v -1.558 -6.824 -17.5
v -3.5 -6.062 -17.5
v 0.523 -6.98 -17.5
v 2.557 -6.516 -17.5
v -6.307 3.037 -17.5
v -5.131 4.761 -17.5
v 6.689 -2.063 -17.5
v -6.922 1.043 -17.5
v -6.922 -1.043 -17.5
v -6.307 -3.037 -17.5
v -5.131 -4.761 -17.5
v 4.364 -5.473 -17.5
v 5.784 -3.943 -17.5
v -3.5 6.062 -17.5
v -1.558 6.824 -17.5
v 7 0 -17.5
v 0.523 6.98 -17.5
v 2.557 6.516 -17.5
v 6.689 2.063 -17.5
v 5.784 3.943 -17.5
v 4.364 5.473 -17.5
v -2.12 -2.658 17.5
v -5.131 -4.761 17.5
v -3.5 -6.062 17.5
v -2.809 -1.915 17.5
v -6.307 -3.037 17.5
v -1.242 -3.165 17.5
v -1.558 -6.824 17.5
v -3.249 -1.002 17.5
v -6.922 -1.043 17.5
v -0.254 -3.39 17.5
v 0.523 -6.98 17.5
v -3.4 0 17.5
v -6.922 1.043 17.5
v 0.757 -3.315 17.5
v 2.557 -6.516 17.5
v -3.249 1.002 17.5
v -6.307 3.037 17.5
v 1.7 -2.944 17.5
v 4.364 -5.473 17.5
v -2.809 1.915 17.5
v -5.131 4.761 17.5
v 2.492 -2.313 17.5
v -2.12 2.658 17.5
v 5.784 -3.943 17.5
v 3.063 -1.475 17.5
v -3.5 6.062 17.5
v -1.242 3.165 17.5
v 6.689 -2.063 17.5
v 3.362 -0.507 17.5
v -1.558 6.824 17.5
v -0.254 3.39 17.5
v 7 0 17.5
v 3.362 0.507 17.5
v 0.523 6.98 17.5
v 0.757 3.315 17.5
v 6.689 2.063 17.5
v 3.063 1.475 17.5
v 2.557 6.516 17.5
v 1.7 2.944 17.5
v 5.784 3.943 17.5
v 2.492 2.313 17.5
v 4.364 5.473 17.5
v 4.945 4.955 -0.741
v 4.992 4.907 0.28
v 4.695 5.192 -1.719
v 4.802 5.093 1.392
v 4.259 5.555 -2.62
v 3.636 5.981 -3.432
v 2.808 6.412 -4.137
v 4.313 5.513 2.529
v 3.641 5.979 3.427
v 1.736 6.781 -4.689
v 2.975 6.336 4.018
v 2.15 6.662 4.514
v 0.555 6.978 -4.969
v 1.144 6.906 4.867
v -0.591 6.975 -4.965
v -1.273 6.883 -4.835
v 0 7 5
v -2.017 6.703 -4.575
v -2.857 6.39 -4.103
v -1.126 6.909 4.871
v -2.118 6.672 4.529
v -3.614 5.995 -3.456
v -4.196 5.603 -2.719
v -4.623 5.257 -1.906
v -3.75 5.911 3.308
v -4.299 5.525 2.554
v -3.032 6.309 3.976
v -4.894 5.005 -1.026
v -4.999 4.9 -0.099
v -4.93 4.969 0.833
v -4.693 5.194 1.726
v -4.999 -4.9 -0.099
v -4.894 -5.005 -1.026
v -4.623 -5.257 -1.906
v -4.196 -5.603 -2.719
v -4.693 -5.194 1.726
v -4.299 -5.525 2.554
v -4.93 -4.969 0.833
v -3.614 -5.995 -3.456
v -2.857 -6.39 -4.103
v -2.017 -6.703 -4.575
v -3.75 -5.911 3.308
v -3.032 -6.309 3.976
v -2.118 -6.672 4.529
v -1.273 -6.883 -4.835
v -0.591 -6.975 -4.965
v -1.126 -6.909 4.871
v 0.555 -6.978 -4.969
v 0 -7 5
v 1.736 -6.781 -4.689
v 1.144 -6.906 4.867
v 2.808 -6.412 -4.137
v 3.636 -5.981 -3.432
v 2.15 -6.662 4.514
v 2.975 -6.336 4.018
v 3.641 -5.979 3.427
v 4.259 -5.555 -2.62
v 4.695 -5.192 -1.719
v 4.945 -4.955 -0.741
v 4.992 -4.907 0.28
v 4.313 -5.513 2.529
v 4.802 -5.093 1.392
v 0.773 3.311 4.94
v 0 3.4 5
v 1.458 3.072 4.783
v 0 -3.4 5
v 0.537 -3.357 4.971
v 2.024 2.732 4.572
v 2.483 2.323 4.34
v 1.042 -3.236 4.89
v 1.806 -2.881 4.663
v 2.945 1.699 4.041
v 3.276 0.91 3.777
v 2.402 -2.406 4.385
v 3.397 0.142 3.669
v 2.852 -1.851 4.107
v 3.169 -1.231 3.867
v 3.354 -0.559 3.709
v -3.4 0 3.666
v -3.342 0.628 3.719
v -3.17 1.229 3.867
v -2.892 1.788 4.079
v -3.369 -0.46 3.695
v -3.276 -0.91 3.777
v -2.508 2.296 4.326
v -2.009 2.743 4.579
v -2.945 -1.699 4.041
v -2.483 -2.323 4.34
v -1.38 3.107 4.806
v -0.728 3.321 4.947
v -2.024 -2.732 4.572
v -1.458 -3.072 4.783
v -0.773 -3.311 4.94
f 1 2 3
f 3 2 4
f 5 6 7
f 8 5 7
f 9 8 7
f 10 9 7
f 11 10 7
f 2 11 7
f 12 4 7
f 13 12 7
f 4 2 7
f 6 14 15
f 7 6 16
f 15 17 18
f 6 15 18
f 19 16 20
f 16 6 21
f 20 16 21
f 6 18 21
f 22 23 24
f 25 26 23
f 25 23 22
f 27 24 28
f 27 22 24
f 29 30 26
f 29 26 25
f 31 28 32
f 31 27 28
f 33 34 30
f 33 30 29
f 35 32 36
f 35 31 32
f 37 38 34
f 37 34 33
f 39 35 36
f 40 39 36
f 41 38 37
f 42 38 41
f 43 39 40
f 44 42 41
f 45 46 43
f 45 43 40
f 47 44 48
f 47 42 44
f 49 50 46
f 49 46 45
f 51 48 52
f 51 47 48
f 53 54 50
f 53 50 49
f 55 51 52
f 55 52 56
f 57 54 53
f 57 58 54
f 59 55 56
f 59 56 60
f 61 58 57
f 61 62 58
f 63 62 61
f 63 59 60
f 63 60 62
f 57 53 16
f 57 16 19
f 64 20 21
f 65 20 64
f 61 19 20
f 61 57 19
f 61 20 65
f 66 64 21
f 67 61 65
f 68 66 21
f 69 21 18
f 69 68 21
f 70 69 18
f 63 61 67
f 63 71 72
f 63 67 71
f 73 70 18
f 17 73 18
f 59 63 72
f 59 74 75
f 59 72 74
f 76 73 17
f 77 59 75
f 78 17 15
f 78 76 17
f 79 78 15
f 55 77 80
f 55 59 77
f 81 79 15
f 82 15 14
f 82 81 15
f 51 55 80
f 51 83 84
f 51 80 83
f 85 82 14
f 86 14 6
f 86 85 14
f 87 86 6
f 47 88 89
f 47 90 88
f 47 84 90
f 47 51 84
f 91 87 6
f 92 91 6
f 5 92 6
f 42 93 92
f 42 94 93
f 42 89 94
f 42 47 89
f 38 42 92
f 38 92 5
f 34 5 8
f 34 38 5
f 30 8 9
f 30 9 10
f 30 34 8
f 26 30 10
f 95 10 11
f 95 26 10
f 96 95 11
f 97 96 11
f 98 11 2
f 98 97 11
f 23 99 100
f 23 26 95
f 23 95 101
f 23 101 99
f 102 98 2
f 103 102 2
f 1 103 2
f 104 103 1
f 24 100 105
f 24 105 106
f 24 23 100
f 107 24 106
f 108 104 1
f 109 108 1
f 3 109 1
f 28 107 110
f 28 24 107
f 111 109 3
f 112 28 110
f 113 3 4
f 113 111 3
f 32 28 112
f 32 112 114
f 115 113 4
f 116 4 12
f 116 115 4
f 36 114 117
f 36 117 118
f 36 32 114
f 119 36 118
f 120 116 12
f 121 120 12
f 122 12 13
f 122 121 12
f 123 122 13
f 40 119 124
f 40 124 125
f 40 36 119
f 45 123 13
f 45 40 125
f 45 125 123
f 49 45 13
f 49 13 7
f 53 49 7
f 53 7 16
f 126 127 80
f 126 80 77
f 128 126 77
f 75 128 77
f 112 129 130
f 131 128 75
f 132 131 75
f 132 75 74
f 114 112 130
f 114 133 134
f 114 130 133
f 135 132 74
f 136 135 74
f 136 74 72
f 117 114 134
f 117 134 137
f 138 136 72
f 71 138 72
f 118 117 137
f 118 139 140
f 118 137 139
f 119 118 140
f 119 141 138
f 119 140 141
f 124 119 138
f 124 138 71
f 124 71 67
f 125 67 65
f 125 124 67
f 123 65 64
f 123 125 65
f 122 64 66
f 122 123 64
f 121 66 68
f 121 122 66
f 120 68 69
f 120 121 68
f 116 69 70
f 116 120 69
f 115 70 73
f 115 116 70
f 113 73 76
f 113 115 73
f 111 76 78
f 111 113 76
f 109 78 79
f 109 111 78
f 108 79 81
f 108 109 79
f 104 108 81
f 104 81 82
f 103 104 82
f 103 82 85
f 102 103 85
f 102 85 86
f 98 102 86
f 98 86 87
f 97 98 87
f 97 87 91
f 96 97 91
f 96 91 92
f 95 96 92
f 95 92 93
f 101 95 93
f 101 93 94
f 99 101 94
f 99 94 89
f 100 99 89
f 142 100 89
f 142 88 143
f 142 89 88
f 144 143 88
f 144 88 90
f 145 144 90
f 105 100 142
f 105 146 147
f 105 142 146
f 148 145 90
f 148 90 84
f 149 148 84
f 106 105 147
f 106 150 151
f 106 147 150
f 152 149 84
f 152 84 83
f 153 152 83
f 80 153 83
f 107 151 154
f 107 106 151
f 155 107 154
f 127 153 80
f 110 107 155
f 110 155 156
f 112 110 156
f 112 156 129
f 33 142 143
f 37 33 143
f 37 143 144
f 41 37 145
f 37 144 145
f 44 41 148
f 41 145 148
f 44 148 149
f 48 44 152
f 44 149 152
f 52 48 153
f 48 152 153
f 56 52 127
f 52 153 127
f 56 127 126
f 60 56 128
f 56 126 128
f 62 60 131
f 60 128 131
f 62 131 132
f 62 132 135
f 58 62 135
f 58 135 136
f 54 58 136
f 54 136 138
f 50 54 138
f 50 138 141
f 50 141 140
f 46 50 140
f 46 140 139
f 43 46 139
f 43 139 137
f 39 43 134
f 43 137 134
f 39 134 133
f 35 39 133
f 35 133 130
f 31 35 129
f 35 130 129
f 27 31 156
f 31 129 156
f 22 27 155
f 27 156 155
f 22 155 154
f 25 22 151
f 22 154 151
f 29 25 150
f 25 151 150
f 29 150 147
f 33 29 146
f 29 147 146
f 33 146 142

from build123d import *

# Parameters (mm, degrees)
ESQUISSE1_R                  = 7
BOSS_EXTRU_1_DEPTH           = 17.5
ENL_V_MAT_EXTRU_1_DEPTH      = 21.105969263
ENL_V_MAT_EXTRU_1_DEPTH_BACK = 21.105969263
ESQUISSE2_R                  = 5
TROU_TARAUD_M81_D            = 6.8
TROU_TARAUD_M81_DEPTH        = 20
TROU_TARAUD_M81_TIP          = 2.042926105


with BuildPart() as part:
    # Esquisse1 → Boss.-Extru.1 (new, symmetric)
    with BuildSketch(Plane.XY):
        Circle(ESQUISSE1_R)
    extrude(amount=BOSS_EXTRU_1_DEPTH, both=True)

    # Esquisse2 → Enlèv. mat.-Extru.1 (cut, two sides: drawn at the far end of the back side and taken through both)
    with BuildSketch(Plane(origin=(0, 0, 0), x_dir=(1, 0, 0), z_dir=(0, 1, 0)).offset(-ENL_V_MAT_EXTRU_1_DEPTH_BACK)):
        with Locations(Location((0, 0, 0), (0, 0, 270))):
            Circle(ESQUISSE2_R)
    extrude(amount=ENL_V_MAT_EXTRU_1_DEPTH + ENL_V_MAT_EXTRU_1_DEPTH_BACK, mode=Mode.SUBTRACT)

    # Trou taraudé M81
    with Locations(Plane.XY.offset(17.5)):
        with Locations((0, 0)):
            Hole(TROU_TARAUD_M81_D / 2, depth=TROU_TARAUD_M81_DEPTH)
            with Locations((0, 0, -(TROU_TARAUD_M81_DEPTH + TROU_TARAUD_M81_TIP / 2))):  # 118° drill point
                Cone(0, TROU_TARAUD_M81_D / 2, TROU_TARAUD_M81_TIP, mode=Mode.SUBTRACT)


solid = part.part
